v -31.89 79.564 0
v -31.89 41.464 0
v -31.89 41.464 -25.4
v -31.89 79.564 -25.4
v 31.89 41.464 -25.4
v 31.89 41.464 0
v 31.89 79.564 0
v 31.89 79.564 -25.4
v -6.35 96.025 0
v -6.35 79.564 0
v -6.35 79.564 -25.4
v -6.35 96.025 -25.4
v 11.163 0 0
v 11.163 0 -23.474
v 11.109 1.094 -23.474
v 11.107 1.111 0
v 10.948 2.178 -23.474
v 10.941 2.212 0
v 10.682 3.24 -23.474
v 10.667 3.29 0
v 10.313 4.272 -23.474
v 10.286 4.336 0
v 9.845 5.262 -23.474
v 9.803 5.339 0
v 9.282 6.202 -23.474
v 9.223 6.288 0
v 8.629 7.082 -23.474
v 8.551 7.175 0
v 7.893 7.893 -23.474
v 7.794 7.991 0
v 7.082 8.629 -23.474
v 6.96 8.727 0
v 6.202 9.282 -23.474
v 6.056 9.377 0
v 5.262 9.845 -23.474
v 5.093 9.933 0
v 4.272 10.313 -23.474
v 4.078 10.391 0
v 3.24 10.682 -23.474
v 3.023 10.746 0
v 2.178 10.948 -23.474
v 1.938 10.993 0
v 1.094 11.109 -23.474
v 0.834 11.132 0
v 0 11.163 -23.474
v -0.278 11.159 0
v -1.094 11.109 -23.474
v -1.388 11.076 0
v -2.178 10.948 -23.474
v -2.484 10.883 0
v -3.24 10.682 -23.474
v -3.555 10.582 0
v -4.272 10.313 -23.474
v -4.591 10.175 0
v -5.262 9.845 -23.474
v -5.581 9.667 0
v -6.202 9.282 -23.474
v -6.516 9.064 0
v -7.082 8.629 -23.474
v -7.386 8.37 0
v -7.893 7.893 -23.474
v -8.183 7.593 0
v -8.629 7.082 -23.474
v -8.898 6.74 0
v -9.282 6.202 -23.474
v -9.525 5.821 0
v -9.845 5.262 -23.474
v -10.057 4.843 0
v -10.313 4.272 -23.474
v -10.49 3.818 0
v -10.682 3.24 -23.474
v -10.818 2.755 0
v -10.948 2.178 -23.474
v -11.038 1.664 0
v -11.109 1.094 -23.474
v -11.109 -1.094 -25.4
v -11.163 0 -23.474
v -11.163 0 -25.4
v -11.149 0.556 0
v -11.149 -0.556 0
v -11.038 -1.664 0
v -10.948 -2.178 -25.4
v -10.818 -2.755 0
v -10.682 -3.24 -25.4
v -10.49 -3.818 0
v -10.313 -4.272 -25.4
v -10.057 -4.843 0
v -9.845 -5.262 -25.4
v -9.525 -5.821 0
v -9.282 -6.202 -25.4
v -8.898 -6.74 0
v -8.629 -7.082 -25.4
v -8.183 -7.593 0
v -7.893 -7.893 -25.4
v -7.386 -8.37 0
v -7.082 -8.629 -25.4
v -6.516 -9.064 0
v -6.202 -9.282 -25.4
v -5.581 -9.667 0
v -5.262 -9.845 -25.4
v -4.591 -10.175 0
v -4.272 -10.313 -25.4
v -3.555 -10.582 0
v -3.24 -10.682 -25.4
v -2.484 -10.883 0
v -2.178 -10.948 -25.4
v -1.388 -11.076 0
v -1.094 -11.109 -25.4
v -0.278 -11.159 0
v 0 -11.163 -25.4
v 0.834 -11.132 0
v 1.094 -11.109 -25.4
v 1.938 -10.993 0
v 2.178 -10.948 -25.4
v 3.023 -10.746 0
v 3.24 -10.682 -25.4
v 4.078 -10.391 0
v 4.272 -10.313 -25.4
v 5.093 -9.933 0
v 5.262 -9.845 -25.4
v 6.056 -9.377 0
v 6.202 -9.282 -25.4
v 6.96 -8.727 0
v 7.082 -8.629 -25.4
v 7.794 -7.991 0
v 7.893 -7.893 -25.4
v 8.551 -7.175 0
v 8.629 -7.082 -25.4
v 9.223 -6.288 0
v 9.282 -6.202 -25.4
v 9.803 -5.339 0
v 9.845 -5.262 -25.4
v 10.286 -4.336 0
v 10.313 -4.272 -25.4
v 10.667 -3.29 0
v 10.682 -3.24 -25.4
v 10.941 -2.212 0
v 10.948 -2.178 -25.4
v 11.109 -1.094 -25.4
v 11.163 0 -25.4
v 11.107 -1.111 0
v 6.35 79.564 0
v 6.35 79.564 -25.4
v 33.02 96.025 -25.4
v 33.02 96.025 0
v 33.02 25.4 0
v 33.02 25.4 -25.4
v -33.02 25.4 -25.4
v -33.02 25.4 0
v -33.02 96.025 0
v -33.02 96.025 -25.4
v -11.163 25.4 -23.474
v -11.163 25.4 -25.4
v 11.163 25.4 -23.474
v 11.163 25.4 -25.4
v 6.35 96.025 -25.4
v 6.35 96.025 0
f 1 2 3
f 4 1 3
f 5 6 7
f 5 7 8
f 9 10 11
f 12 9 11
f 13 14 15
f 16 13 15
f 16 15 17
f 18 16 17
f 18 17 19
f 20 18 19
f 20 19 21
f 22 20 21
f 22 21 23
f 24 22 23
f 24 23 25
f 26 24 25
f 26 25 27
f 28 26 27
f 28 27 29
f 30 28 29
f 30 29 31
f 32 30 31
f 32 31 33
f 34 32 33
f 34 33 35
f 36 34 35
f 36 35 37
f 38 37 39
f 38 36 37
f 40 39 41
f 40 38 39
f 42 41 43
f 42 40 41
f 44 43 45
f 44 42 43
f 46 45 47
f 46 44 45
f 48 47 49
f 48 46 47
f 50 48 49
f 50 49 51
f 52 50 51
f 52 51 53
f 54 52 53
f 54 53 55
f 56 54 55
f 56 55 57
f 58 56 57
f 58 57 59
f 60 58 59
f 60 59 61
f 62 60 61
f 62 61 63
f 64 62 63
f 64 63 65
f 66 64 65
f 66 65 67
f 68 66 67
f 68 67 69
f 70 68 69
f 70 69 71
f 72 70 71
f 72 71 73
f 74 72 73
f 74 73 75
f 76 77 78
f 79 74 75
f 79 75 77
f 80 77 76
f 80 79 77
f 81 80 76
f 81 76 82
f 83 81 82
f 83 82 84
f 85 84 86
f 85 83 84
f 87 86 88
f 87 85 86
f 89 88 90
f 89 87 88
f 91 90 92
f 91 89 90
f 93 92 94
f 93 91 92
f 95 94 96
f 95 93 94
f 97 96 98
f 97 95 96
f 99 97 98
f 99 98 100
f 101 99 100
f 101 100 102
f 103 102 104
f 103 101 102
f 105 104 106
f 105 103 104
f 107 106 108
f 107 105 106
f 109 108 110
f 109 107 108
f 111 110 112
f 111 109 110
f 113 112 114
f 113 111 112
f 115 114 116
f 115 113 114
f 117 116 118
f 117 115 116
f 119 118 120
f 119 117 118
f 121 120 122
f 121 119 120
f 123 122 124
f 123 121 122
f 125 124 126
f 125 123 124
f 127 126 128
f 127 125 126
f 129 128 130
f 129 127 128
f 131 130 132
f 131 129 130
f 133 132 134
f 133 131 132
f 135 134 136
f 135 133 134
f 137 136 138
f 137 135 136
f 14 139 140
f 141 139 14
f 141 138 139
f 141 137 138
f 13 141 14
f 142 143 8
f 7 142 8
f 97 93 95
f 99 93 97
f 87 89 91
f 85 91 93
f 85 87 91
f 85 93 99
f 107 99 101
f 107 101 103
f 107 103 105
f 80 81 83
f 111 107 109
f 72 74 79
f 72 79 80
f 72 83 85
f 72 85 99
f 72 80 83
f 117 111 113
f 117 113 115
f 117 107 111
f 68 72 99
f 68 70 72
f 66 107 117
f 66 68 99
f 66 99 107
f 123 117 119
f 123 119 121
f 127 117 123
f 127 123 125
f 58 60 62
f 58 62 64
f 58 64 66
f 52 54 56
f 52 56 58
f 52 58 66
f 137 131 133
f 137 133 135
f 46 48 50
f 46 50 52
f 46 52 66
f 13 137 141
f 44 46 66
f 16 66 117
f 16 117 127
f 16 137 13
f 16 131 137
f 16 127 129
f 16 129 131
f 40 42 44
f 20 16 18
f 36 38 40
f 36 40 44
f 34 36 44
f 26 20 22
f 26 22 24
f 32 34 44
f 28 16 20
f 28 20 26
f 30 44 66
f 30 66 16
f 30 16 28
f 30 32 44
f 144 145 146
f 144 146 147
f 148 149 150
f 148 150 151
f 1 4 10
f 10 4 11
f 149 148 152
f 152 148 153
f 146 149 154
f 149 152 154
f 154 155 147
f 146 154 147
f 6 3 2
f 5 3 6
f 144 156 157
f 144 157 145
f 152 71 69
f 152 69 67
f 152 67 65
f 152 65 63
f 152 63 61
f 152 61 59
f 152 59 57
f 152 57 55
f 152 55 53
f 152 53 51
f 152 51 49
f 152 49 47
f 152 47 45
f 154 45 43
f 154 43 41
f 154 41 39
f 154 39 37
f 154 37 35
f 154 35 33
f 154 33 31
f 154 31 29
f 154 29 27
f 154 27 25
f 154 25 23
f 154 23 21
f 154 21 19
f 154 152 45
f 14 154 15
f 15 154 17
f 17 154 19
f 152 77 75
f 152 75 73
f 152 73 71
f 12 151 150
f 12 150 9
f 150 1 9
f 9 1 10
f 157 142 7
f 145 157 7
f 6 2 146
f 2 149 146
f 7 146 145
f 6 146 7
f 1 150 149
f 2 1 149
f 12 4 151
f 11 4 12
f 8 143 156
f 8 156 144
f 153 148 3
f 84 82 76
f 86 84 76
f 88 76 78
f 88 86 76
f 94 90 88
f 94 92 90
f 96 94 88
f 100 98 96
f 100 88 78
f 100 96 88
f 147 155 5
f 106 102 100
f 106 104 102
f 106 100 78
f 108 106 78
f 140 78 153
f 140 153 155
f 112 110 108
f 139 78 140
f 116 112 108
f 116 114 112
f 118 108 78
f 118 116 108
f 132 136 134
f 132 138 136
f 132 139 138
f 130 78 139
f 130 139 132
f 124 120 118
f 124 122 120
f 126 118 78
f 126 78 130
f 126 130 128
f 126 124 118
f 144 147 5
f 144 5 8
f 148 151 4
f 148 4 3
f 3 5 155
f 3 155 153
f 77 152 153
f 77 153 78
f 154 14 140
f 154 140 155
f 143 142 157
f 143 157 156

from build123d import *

# Parameters (mm, degrees)
SKETCH1_R           = 11.162804955
BOSS_EXTRUDE1_DEPTH = 25.4
BOSS_EXTRUDE2_START = -1.926431551
BOSS_EXTRUDE2_DEPTH = 1.926431551
SKETCH4_W           = 66.04
SKETCH4_H           = 25.4
BOSS_EXTRUDE3_DEPTH = 16.064370514
SKETCH5_W           = 1.129641984
SKETCH5_H           = 25.4
BOSS_EXTRUDE4_DEPTH = 38.1
SKETCH6_W           = 26.67
SKETCH6_H           = 25.4
BOSS_EXTRUDE5_DEPTH = 16.461081374


with BuildPart() as part:
    # Sketch1 → Boss-Extrude1 (new body)
    with BuildSketch(Plane.XY):
        Circle(SKETCH1_R)
    extrude(amount=-BOSS_EXTRUDE1_DEPTH)

    # Sketch2 → Boss-Extrude2 (add)
    with BuildSketch(Plane(origin=(0, 0, -25.4), x_dir=(-1, 0, 0), z_dir=(0, 0, -1)).offset(BOSS_EXTRUDE2_START)):
        with BuildLine():
            Line((-11.162804955, 0), (-11.162804955, 25.4))
            Line((-11.162804955, 25.4), (11.162804955, 25.4))
            Line((11.162804955, 25.4), (11.162804955, 0))
            ThreePointArc((11.162804955, 0), (0, 11.162804955), (-11.162804955, 0))
        make_face()
    extrude(amount=BOSS_EXTRUDE2_DEPTH)

    # Sketch4 → Boss-Extrude3 (add)
    with BuildSketch(Plane(origin=(0, 25.4, 0), x_dir=(1, 0, 0), z_dir=(0, 1, 0))):
        with Locations((0, 12.7)):
            Rectangle(SKETCH4_W, SKETCH4_H)
    extrude(amount=BOSS_EXTRUDE3_DEPTH)

    # Sketch5 → Boss-Extrude4 (add)
    with BuildSketch(Plane(origin=(0, 41.464370514, 0), x_dir=(1, 0, 0), z_dir=(0, 1, 0))):
        with Locations((-32.455179008, 12.7)):
            Rectangle(SKETCH5_W, SKETCH5_H)
        with Locations((32.455179008, 12.7)):
            Rectangle(SKETCH5_W, SKETCH5_H)
    extrude(amount=BOSS_EXTRUDE4_DEPTH)

    # Sketch6 → Boss-Extrude5 (add)
    with BuildSketch(Plane(origin=(0, 79.564370514, 0), x_dir=(1, 0, 0), z_dir=(0, 1, 0))):
        with Locations((19.685, 12.7)):
            Rectangle(SKETCH6_W, SKETCH6_H)
        with Locations((-19.685, 12.7)):
            Rectangle(SKETCH6_W, SKETCH6_H)
    extrude(amount=BOSS_EXTRUDE5_DEPTH)


solid = part.part
